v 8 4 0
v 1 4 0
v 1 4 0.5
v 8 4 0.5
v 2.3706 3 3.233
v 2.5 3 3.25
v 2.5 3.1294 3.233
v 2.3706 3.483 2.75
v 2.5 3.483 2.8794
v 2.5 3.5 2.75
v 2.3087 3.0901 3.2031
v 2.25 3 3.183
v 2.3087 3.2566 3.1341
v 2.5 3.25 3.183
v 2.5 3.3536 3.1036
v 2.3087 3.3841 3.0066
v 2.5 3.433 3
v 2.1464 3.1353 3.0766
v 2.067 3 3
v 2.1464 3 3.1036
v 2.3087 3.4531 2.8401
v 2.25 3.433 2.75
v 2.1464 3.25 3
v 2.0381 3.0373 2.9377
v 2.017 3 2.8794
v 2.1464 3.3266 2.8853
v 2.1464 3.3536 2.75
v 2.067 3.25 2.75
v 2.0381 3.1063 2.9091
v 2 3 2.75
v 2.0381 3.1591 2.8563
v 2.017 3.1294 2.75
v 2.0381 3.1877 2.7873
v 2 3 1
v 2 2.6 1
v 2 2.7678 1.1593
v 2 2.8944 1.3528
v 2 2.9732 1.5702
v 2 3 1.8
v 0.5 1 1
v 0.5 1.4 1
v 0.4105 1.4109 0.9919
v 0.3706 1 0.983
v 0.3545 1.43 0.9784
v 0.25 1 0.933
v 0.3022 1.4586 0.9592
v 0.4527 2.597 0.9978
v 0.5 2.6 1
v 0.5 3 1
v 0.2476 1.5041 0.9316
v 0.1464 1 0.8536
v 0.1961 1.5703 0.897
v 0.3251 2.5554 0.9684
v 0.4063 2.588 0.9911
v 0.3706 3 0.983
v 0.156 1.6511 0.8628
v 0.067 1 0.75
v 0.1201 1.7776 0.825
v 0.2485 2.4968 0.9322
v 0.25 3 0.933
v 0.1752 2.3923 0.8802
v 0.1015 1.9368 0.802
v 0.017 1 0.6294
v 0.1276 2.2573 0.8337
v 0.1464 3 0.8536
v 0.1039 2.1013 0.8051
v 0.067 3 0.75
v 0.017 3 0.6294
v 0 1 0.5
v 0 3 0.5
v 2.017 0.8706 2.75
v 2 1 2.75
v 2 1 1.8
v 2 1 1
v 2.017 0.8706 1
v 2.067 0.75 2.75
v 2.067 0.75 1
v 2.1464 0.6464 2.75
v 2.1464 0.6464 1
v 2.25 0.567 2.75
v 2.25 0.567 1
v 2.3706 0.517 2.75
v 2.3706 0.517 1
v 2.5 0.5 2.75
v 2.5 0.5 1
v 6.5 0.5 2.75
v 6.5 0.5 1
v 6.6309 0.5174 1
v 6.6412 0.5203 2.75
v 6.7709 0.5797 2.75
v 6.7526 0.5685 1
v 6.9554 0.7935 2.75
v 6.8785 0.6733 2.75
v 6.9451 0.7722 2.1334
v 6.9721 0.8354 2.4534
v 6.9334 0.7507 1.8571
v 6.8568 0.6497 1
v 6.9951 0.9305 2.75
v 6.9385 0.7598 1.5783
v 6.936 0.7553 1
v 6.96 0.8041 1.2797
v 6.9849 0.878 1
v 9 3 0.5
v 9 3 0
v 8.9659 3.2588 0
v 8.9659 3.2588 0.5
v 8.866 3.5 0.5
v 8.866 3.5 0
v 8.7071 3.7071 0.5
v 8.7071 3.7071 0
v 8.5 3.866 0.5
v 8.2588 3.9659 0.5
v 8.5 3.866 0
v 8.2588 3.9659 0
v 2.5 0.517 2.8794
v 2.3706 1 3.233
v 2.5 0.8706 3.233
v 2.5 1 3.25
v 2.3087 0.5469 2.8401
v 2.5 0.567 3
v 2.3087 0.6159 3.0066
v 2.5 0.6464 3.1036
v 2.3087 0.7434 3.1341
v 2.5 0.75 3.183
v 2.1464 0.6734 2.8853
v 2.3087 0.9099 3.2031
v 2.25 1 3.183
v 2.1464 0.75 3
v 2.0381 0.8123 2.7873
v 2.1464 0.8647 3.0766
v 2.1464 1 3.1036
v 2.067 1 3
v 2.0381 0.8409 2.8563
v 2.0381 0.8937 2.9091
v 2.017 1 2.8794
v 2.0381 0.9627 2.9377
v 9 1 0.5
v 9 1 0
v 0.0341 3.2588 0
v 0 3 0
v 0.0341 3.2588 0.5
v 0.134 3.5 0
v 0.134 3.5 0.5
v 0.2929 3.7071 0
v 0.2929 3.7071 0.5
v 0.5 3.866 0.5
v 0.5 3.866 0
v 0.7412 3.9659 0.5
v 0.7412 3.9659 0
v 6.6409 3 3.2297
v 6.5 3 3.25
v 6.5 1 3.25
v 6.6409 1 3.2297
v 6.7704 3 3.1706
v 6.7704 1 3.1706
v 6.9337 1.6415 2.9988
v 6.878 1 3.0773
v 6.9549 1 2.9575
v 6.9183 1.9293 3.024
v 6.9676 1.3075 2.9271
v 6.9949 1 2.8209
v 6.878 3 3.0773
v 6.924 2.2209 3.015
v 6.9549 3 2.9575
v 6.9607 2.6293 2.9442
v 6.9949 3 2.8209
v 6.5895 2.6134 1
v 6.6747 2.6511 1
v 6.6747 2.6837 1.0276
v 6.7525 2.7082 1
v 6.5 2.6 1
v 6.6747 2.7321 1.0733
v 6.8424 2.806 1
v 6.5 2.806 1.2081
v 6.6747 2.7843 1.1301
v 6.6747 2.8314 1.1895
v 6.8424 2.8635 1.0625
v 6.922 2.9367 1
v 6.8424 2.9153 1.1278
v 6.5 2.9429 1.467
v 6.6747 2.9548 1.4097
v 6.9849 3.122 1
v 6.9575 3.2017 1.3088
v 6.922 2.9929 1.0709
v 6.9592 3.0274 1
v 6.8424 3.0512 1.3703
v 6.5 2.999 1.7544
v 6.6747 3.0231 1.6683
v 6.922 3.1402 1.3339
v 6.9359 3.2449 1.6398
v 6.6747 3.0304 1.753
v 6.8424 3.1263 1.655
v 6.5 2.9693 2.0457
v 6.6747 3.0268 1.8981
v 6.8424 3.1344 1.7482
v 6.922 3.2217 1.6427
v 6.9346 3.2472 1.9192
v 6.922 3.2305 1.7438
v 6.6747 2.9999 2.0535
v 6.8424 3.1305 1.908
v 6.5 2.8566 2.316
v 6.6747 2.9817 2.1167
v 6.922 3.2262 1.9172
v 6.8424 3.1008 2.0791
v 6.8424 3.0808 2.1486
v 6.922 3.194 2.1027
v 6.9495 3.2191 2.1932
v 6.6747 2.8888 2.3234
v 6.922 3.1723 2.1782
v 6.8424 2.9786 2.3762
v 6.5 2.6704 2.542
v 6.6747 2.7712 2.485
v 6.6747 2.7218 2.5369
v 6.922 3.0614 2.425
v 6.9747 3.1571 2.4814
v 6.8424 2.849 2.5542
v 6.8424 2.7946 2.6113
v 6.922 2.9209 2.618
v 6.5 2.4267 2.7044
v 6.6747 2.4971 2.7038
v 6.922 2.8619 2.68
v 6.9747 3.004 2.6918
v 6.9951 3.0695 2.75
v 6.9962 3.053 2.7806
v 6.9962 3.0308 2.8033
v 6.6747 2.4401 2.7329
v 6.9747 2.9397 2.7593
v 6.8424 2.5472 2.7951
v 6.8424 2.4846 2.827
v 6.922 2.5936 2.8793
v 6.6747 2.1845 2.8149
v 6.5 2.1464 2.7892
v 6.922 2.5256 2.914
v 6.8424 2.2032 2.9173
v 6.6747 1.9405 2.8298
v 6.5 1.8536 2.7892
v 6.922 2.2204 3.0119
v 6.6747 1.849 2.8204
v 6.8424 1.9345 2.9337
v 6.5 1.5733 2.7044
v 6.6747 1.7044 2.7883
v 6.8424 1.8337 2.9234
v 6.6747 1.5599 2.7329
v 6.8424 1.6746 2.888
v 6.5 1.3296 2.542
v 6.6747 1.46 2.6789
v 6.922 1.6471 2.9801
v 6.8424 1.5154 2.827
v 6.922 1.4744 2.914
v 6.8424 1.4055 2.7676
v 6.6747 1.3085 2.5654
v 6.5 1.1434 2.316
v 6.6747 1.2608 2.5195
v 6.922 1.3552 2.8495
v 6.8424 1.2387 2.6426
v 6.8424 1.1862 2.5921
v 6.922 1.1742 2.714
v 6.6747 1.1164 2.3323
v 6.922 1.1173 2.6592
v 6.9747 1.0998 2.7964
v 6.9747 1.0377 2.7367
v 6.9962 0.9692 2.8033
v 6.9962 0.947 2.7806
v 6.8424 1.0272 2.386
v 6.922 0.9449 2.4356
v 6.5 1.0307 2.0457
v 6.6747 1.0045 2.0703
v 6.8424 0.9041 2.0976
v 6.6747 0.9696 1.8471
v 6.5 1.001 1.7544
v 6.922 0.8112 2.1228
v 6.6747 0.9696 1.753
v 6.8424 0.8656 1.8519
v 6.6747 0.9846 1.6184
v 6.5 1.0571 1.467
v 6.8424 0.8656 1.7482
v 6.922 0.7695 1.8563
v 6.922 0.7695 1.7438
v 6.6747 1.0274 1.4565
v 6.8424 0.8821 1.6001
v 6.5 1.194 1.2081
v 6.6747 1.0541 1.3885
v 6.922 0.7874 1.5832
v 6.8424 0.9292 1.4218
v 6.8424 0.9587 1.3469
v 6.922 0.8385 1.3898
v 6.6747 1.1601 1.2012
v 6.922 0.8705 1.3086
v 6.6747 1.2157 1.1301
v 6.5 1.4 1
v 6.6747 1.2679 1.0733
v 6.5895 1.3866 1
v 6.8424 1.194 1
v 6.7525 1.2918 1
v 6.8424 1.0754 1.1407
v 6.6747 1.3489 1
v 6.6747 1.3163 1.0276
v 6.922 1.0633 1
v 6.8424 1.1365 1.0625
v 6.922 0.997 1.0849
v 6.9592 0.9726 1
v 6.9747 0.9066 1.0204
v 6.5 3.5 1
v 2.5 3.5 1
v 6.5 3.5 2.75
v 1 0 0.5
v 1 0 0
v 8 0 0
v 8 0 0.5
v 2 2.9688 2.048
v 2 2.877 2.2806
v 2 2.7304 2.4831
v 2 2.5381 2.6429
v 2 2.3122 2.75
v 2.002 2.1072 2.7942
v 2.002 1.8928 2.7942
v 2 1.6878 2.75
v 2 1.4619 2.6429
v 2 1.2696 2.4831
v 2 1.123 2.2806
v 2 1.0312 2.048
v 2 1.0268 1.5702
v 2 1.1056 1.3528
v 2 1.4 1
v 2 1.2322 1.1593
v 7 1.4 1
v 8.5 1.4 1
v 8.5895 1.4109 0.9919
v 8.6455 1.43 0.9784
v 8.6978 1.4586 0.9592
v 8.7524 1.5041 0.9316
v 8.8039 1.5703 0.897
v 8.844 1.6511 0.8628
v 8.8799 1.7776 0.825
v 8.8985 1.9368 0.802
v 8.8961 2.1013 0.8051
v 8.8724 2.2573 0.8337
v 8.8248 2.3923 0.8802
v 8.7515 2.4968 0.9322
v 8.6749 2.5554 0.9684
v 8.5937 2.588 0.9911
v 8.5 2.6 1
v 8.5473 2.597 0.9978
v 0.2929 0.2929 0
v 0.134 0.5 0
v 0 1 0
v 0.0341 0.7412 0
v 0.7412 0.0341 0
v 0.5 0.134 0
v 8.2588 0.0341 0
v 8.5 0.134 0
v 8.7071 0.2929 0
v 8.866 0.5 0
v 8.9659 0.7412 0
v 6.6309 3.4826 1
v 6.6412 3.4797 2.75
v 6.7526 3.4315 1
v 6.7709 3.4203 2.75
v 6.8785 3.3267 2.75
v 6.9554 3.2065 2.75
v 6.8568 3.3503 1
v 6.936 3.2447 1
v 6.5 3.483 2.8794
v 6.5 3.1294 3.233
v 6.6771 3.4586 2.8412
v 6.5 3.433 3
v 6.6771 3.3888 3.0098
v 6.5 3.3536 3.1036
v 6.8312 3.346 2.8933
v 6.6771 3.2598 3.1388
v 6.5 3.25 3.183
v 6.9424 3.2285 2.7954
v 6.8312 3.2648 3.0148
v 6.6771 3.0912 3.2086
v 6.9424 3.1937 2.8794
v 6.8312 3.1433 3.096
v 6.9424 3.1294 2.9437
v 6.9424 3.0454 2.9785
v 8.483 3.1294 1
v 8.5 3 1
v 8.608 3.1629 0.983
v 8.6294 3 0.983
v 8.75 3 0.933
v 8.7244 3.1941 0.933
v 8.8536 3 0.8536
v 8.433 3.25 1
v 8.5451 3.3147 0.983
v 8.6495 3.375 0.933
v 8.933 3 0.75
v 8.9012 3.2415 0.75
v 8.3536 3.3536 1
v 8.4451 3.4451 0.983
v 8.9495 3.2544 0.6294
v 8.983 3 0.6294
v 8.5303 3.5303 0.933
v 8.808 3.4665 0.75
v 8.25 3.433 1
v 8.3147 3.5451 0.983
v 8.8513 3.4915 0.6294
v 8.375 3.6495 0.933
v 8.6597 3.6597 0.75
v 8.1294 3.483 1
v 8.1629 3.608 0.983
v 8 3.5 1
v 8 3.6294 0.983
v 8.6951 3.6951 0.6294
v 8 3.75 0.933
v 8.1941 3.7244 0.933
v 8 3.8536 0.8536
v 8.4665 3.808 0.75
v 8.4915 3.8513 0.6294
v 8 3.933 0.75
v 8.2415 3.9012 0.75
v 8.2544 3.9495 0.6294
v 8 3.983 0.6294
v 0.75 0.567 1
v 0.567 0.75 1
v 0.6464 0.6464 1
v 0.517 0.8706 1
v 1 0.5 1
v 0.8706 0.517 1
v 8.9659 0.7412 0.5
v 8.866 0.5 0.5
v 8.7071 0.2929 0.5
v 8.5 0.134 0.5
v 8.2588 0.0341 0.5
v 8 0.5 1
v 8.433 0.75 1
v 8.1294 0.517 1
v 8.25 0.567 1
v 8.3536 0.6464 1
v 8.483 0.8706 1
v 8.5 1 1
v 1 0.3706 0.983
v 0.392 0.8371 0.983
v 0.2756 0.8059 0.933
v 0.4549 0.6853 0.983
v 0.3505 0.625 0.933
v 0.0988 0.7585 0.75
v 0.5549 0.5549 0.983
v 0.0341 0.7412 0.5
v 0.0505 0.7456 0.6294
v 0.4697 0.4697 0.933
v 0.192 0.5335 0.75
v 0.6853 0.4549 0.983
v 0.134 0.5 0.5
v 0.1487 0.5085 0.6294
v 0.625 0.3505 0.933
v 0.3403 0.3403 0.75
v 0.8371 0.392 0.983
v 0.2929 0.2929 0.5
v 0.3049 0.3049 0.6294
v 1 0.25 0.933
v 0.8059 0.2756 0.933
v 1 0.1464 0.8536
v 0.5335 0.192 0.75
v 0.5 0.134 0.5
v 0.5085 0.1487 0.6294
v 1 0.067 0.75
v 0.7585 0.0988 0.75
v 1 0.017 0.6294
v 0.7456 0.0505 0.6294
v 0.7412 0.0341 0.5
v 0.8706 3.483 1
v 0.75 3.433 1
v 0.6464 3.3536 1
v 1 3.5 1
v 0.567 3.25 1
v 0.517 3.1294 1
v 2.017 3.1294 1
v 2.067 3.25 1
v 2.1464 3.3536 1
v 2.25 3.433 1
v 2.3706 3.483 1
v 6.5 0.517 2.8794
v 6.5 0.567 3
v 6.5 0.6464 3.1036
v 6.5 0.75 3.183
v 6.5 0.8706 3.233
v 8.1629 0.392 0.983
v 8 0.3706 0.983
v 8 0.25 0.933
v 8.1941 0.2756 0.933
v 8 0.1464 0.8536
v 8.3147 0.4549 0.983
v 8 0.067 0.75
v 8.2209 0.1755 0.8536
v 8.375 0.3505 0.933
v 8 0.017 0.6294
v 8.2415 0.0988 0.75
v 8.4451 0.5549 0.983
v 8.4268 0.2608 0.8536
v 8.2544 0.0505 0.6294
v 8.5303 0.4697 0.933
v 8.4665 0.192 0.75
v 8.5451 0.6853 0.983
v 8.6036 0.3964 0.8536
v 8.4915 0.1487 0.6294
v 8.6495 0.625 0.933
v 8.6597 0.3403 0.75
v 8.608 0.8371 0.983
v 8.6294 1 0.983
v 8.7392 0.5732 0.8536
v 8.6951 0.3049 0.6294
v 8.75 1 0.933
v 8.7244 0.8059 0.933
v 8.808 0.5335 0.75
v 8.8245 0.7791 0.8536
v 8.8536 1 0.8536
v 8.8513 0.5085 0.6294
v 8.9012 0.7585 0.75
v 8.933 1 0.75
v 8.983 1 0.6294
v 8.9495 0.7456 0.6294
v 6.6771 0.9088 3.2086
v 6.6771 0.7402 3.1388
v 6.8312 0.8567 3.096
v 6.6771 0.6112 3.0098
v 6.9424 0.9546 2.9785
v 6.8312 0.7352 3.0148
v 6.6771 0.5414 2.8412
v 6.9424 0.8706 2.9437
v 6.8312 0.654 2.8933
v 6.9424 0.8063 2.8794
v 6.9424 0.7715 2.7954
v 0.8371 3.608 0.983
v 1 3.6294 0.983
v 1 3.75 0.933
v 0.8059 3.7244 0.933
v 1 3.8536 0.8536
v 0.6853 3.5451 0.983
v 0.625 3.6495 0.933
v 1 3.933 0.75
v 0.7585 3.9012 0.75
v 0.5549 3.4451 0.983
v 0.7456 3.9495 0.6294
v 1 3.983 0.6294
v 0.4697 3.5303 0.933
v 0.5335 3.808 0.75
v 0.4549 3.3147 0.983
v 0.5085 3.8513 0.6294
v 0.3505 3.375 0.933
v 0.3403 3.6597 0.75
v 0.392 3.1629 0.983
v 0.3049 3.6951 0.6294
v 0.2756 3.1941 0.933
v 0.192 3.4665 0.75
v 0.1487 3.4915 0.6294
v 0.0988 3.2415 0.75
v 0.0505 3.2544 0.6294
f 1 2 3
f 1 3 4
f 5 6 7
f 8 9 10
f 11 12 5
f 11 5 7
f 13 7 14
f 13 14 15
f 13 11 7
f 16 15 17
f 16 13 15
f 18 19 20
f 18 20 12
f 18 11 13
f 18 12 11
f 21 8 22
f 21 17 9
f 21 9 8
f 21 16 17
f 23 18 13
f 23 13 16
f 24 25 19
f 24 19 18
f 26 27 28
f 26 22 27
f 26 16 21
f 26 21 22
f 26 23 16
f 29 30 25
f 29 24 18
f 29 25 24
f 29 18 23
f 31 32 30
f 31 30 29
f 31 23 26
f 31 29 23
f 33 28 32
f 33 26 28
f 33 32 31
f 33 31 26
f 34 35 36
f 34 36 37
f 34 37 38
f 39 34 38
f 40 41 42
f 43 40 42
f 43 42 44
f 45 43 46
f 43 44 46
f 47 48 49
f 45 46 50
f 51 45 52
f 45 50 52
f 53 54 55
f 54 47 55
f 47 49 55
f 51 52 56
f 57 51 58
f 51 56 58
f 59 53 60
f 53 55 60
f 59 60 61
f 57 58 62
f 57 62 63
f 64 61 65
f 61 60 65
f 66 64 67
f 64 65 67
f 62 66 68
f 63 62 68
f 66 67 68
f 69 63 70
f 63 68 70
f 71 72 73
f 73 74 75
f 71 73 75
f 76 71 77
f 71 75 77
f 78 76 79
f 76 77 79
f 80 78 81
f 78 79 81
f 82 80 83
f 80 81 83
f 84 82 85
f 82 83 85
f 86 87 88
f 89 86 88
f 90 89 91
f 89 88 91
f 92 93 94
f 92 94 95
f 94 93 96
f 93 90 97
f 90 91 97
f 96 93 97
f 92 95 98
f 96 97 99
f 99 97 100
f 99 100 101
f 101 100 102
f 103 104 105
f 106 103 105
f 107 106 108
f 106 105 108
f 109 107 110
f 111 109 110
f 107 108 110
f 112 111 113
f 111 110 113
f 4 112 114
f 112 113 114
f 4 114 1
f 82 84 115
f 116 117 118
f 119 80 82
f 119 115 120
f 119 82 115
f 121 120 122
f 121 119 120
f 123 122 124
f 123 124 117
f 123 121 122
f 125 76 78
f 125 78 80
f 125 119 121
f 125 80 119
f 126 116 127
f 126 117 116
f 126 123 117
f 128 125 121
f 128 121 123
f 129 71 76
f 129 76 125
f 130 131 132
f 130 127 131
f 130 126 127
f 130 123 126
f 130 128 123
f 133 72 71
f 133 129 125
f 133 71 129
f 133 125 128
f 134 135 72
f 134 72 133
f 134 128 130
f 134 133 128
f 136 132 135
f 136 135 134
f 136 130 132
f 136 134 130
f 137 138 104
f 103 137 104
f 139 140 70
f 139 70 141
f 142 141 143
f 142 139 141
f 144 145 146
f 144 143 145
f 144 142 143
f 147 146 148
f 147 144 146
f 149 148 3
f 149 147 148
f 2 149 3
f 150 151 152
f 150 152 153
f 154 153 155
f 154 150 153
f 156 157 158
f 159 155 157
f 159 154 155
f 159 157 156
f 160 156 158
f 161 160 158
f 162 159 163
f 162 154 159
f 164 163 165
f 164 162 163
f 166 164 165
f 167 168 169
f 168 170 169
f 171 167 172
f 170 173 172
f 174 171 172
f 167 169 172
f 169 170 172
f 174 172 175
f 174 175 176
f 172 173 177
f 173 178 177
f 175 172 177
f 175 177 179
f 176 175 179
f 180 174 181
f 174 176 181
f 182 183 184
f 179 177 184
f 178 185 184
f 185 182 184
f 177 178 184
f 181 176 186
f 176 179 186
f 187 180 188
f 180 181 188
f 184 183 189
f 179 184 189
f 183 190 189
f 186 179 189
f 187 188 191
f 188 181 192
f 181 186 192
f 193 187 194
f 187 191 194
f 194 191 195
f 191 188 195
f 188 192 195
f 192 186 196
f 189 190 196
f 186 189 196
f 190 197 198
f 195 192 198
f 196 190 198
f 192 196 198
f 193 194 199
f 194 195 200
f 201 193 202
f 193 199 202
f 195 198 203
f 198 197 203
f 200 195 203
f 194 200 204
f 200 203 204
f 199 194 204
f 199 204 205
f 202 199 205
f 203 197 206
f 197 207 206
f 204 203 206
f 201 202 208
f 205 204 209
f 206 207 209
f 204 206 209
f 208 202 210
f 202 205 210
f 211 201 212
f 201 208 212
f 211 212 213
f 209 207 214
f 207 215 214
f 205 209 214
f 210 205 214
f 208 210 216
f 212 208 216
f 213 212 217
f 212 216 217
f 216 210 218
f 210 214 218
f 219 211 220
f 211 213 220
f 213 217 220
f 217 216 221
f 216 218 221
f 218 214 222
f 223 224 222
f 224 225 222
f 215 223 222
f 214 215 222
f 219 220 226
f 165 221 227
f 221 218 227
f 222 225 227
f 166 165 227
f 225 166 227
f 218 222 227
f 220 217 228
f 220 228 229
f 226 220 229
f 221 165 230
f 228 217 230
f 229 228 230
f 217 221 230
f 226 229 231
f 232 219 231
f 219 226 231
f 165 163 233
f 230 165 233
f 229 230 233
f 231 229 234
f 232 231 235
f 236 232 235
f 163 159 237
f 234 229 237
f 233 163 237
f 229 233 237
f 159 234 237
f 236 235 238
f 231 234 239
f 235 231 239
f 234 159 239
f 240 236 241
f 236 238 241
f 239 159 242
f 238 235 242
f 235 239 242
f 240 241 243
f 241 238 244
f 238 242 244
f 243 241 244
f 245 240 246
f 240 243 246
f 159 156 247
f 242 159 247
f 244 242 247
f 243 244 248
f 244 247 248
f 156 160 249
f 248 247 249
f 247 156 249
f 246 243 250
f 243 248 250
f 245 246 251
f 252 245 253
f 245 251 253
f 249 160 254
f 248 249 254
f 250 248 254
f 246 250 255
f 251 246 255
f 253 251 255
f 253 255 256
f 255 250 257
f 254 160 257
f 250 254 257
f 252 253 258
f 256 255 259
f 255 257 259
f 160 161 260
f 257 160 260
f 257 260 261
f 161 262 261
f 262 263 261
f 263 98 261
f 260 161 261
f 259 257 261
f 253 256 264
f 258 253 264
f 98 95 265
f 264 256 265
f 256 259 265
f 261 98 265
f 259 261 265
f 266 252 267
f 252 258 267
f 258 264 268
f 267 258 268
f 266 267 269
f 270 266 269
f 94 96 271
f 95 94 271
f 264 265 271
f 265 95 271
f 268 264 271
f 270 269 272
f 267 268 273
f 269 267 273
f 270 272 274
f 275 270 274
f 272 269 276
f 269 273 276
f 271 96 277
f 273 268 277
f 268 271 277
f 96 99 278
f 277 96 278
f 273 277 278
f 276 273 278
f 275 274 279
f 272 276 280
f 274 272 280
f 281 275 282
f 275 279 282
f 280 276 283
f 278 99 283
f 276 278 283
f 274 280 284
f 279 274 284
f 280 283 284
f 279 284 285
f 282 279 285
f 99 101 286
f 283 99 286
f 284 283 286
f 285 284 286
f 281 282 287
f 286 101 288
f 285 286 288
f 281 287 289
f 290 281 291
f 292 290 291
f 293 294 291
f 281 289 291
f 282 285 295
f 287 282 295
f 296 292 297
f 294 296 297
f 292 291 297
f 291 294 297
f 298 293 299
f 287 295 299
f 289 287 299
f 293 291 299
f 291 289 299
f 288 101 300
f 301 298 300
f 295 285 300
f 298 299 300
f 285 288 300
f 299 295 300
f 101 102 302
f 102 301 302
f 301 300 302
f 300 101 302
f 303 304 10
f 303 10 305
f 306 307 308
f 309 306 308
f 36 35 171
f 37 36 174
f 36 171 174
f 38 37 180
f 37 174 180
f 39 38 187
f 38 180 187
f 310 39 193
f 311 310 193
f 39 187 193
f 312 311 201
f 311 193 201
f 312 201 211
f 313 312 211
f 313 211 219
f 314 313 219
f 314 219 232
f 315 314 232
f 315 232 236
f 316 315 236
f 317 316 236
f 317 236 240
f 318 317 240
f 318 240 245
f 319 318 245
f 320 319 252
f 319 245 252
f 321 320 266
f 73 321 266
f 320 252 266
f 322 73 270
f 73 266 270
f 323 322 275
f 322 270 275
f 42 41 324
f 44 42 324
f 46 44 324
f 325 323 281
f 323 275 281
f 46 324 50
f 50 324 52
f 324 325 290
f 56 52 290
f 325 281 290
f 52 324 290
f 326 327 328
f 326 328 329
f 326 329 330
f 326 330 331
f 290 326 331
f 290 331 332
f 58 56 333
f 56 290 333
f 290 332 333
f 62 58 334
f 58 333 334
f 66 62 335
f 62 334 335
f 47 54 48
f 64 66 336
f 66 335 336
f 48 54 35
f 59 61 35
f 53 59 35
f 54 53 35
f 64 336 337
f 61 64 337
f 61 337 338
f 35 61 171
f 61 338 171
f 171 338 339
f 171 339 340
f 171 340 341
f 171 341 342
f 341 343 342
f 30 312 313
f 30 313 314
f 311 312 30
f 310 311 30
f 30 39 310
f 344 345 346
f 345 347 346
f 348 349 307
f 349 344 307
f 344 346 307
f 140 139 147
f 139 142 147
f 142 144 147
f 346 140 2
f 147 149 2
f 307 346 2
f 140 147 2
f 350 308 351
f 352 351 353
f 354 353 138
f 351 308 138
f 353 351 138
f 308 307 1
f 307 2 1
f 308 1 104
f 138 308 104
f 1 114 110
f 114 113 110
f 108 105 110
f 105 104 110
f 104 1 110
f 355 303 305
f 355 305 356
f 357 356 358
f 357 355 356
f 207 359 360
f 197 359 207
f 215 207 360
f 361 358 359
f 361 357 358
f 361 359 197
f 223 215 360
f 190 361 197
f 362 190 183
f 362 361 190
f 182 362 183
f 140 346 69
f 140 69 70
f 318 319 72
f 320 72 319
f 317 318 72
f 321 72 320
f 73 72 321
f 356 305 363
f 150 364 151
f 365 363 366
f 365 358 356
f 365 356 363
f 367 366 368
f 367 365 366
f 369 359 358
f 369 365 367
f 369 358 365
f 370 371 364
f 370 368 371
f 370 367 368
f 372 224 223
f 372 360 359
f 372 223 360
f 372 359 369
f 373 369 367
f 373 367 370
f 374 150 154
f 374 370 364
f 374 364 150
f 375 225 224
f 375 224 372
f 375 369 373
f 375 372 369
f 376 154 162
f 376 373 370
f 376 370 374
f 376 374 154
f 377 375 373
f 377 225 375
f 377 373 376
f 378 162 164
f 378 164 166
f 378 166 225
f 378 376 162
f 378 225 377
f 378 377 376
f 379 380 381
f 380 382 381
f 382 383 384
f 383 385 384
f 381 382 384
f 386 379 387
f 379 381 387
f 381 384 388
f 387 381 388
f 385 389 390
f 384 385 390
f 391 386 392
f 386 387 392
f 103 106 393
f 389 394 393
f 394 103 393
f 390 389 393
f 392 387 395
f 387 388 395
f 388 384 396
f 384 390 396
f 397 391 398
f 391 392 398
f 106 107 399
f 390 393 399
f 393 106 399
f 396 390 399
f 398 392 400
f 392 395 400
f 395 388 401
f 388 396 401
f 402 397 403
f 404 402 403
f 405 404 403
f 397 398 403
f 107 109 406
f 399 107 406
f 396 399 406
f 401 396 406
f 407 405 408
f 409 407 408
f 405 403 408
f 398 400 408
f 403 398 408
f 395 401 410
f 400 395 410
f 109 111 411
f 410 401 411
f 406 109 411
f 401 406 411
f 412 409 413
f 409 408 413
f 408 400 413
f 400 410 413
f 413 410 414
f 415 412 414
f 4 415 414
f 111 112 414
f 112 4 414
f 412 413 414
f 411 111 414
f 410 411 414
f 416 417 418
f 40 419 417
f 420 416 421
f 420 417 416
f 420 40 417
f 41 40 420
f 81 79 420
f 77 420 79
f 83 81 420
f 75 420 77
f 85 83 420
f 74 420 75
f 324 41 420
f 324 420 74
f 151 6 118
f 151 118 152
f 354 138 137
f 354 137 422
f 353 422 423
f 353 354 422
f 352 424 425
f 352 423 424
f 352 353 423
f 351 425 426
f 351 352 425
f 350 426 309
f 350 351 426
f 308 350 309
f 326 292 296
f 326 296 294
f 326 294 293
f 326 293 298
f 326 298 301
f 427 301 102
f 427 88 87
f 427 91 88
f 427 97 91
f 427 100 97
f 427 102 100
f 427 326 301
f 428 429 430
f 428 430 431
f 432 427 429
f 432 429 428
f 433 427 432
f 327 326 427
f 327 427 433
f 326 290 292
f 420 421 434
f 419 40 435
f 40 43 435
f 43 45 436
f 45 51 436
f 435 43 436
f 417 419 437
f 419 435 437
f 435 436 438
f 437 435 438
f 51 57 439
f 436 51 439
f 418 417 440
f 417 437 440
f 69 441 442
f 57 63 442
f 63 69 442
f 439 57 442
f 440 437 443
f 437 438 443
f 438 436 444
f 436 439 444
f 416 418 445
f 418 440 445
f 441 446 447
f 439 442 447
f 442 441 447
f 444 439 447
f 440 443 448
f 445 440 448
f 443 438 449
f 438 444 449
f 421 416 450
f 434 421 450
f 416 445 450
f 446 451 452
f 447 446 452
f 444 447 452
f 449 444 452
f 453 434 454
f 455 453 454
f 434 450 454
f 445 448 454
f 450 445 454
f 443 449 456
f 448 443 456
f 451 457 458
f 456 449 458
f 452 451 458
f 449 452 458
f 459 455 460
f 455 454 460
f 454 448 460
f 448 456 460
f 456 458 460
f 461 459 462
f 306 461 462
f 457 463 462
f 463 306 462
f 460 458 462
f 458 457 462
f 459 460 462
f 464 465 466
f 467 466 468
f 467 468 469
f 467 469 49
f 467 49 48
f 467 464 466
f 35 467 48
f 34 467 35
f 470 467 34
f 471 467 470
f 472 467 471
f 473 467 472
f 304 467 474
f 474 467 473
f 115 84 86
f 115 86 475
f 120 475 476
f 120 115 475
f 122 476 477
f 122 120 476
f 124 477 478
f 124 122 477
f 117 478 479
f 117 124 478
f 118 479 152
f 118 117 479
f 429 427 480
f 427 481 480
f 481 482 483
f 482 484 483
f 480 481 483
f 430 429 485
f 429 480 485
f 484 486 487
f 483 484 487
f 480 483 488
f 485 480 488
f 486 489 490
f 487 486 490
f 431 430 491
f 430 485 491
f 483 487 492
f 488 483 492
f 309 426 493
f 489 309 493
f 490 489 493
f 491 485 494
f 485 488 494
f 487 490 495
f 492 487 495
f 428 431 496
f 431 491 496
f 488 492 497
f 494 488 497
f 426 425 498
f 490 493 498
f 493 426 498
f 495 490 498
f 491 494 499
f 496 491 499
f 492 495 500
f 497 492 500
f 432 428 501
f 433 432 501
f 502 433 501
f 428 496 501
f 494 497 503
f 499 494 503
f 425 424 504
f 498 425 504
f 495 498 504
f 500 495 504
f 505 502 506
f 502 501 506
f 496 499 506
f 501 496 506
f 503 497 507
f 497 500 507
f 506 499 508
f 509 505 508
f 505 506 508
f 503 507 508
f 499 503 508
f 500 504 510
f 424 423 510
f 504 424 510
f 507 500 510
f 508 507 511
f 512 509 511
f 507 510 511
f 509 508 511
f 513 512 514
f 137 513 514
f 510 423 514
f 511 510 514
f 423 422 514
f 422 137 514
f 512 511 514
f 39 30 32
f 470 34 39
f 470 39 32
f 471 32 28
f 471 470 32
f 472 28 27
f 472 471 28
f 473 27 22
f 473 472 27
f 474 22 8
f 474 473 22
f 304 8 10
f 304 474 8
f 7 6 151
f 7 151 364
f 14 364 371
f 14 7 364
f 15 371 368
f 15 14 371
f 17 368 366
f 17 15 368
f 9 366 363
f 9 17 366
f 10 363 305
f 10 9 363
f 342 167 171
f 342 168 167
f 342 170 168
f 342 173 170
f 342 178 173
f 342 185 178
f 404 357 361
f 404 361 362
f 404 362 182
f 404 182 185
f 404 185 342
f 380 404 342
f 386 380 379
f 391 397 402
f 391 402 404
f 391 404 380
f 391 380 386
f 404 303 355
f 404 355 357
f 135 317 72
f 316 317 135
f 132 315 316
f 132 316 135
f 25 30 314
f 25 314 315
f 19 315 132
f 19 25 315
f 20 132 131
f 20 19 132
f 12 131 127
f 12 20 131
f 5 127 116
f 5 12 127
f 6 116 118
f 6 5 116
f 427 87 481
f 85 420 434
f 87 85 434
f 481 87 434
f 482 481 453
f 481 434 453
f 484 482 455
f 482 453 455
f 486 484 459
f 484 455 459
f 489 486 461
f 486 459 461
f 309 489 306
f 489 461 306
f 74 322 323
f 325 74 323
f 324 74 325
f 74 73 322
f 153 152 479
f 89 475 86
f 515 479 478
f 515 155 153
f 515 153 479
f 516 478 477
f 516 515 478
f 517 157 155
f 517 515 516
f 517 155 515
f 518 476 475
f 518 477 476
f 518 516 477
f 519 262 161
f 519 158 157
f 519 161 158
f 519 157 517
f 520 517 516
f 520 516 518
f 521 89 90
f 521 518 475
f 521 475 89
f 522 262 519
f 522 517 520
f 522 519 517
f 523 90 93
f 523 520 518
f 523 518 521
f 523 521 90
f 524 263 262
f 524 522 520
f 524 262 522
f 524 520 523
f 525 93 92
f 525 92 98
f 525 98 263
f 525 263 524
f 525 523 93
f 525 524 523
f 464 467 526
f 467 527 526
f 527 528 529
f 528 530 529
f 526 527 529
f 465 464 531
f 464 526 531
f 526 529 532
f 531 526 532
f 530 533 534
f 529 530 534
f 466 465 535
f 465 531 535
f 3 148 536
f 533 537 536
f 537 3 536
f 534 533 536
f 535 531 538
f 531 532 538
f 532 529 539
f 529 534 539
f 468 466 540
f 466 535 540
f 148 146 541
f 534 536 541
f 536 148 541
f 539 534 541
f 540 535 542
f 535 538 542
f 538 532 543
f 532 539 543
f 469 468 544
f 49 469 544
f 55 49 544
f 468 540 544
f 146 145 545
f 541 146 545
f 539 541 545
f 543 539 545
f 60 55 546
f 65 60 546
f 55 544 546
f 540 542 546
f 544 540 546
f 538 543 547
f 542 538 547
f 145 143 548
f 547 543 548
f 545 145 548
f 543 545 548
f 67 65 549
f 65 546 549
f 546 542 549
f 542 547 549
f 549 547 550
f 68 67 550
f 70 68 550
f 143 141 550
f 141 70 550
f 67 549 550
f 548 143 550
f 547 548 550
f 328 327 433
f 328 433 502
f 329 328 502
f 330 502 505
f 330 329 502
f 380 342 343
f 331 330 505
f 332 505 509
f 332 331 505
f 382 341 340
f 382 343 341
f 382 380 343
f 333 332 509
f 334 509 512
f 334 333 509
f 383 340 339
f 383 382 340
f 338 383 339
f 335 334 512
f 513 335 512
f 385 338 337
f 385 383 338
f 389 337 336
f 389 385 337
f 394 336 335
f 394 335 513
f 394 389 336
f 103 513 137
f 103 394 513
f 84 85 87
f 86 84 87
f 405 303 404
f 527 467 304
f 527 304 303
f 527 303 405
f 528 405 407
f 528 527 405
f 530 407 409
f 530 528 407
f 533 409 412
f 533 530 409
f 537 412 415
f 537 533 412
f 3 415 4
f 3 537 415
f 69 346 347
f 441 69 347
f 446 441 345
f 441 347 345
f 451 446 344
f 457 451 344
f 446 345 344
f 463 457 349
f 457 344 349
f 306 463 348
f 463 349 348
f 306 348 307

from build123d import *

# Parameters (mm, degrees)
F0_W         = 5
F0_H         = 3
F1_DEPTH     = 3.25
F0_W_2       = 9
F0_H_2       = 4
F2_DEPTH     = 1
F5_DEPTH     = 12.5
F6_T1_DEPTH  = 4
F6_T3_DEPTH  = 2
F6_T5_DEPTH  = 1.75
F6_S9_W      = 0.5
F6_S9_H      = 0.5
F6_T10_DEPTH = 0.5
F6_S15_W     = 0.5
F6_S15_H     = 0.5
F6_T16_DEPTH = 0.5
F6_S21_W     = 0.5
F6_S21_H     = 0.5
F6_T22_DEPTH = 0.5
F6_S27_W     = 0.5
F6_S27_H     = 0.5
F6_T28_DEPTH = 0.5
F6_T34_ANGLE = 359.64
F7_T1_DEPTH  = 15
F7_T3_DEPTH  = 7.4
F7_T5_DEPTH  = 7.4
F8_T1_DEPTH  = 3.5
F8_T4_ANGLE  = 90
F8_T6_ANGLE  = 90
F8_T8_ANGLE  = 90
F8_T10_ANGLE = 90


# Not quite as in the source:
# - a fillet or chamfer that OpenCascade refuses, or shapes differently, is made with other operations: its cross-section is extruded or revolved along the edge and cut away or added
# - a feature names something its author has since deleted; it is built from what else it names


with BuildPart() as f1:
    # F0 (on Top) → F1 (new body)
    with BuildSketch(Plane.XY):
        with Locations((4.5, 2)):
            Rectangle(F0_W, F0_H)
    extrude(amount=F1_DEPTH)

    # F0 (on Top) → F2 (join)
    with BuildSketch(Plane.XY):
        with Locations((4.5, 2)):
            Rectangle(F0_W_2, F0_H_2)
        with Locations((4.5, 2)):
            Rectangle(F0_W, F0_H, mode=Mode.SUBTRACT)
    extrude(amount=F2_DEPTH)

    # F4 (on face) → F5 (cut, symmetric)
    with BuildSketch(Plane.YZ.offset(7)):
        with BuildLine():
            Line((2.6, 1), (1.4, 1))
            ThreePointArc((1.4, 1), (2, 0.8), (2.6, 1))
        make_face()
        with BuildLine():
            ThreePointArc((2.6, 1), (2.894427191, 1.3527864045), (3, 1.8))
            ThreePointArc((3, 1.8), (1.5527864045, 2.694427191), (1.4, 1))
            Line((1.4, 1), (2.6, 1))
        make_face()
    extrude(amount=F5_DEPTH, both=True, mode=Mode.SUBTRACT)

    # F6: fillet of radius 0.5 on 9 edges, made by hand

    # F6_s2 → F6_t1 (cut)
    with BuildSketch(Plane.YZ.offset(2.5)):
        with BuildLine():
            ThreePointArc((0.5, 2.75), (0.6464466094, 3.1035533906), (1, 3.25))
            Line((1, 3.25), (0.5, 3.25))
            Line((0.5, 3.25), (0.5, 2.75))
        make_face()
        with BuildLine():
            ThreePointArc((3, 3.25), (3.3535533906, 3.1035533906), (3.5, 2.75))
            Line((3.5, 2.75), (3.5, 3.25))
            Line((3.5, 3.25), (3, 3.25))
        make_face()
    extrude(amount=F6_T1_DEPTH, mode=Mode.SUBTRACT)

    # F6_s4 → F6_t3 (cut)
    with BuildSketch(Plane.XZ.offset(-3)):
        with BuildLine():
            ThreePointArc((6.5, 3.25), (6.8535533906, 3.1035533906), (7, 2.75))
            Line((7, 2.75), (7, 3.25))
            Line((7, 3.25), (6.5, 3.25))
        make_face()
        with BuildLine():
            ThreePointArc((2, 2.75), (2.1464466094, 3.1035533906), (2.5, 3.25))
            Line((2.5, 3.25), (2, 3.25))
            Line((2, 3.25), (2, 2.75))
        make_face()
    extrude(amount=F6_T3_DEPTH, mode=Mode.SUBTRACT)

    # F6_s6 → F6_t5 (cut)
    with BuildSketch(Plane.XY.offset(1)):
        with BuildLine():
            ThreePointArc((6.5, 0.5), (6.8535533906, 0.6464466094), (7, 1))
            Line((7, 1), (7, 0.5))
            Line((7, 0.5), (6.5, 0.5))
        make_face()
        with BuildLine():
            ThreePointArc((6.5, 3.5), (6.8535533906, 3.3535533906), (7, 3))
            Line((7, 3), (7, 3.5))
            Line((7, 3.5), (6.5, 3.5))
        make_face()
        with BuildLine():
            ThreePointArc((2, 1), (2.1464466094, 0.6464466094), (2.5, 0.5))
            Line((2.5, 0.5), (2, 0.5))
            Line((2, 0.5), (2, 1))
        make_face()
        with BuildLine():
            ThreePointArc((2, 3), (2.1464466094, 3.3535533906), (2.5, 3.5))
            Line((2.5, 3.5), (2, 3.5))
            Line((2, 3.5), (2, 3))
        make_face()
    extrude(amount=F6_T5_DEPTH, mode=Mode.SUBTRACT)


with BuildPart() as f6_tool8:
    # F6_s9 → F6_t10 (new body)
    with BuildSketch(Plane.YZ.offset(2.5)):
        with Locations((0.75, 3)):
            Rectangle(F6_S9_W, F6_S9_H)
    extrude(amount=-F6_T10_DEPTH)

    # F6_s11 → F6_t12 (revolve, cut)
    with BuildSketch(Plane(origin=(2.5, 1, 2.75), x_dir=(0, 0.7071067812, -0.7071067812), z_dir=(0, 0.7071067812, 0.7071067812))):
        with BuildLine():
            ThreePointArc((0, -0.5), (0.5, 0), (0, 0.5))
            Line((0, 0.5), (0, -0.5))
        make_face()
    revolve(axis=Axis((2.5, 1, 2.75), (-1, 0, 0)), mode=Mode.SUBTRACT)


with BuildPart() as f1_1:
    add(f1.part)

    # F6_t7: cut F6_tool8
    add(f6_tool8.part, mode=Mode.SUBTRACT)


with BuildPart() as f6_tool14:
    # F6_s15 → F6_t16 (new body)
    with BuildSketch(Plane.YZ.offset(6.5)):
        with Locations((0.75, 3)):
            Rectangle(F6_S15_W, F6_S15_H)
    extrude(amount=F6_T16_DEPTH)

    # F6_s17 → F6_t18 (revolve, cut)
    with BuildSketch(Plane(origin=(6.5, 1, 2.75), x_dir=(0, 0.7071067812, -0.7071067812), z_dir=(0, -0.7071067812, -0.7071067812))):
        with BuildLine():
            ThreePointArc((0, -0.5), (0.5, 0), (0, 0.5))
            Line((0, 0.5), (0, -0.5))
        make_face()
    revolve(axis=Axis((6.5, 1, 2.75), (1, 0, 0)), mode=Mode.SUBTRACT)


with BuildPart() as f1_2:
    add(f1_1.part)

    # F6_t13: cut F6_tool14
    add(f6_tool14.part, mode=Mode.SUBTRACT)


with BuildPart() as f6_tool20:
    # F6_s21 → F6_t22 (new body)
    with BuildSketch(Plane.YZ.offset(6.5)):
        with Locations((3.25, 3)):
            Rectangle(F6_S21_W, F6_S21_H)
    extrude(amount=F6_T22_DEPTH)

    # F6_s23 → F6_t24 (revolve, cut)
    with BuildSketch(Plane(origin=(6.5, 3, 2.75), x_dir=(0, -0.7071067812, -0.7071067812), z_dir=(0, -0.7071067812, 0.7071067812))):
        with BuildLine():
            ThreePointArc((0, -0.5), (0.5, 0), (0, 0.5))
            Line((0, 0.5), (0, -0.5))
        make_face()
    revolve(axis=Axis((6.5, 3, 2.75), (1, 0, 0)), mode=Mode.SUBTRACT)


with BuildPart() as f1_3:
    add(f1_2.part)

    # F6_t19: cut F6_tool20
    add(f6_tool20.part, mode=Mode.SUBTRACT)


with BuildPart() as f6_tool26:
    # F6_s27 → F6_t28 (new body)
    with BuildSketch(Plane.YZ.offset(2.5)):
        with Locations((3.25, 3)):
            Rectangle(F6_S27_W, F6_S27_H)
    extrude(amount=-F6_T28_DEPTH)

    # F6_s29 → F6_t30 (revolve, cut)
    with BuildSketch(Plane(origin=(2.5, 3, 2.75), x_dir=(0, -0.7071067812, -0.7071067812), z_dir=(0, 0.7071067812, -0.7071067812))):
        with BuildLine():
            ThreePointArc((0, -0.5), (0.5, 0), (0, 0.5))
            Line((0, 0.5), (0, -0.5))
        make_face()
    revolve(axis=Axis((2.5, 3, 2.75), (-1, 0, 0)), mode=Mode.SUBTRACT)


with BuildPart() as f1_4:
    add(f1_3.part)

    # F6_t25: cut F6_tool26
    add(f6_tool26.part, mode=Mode.SUBTRACT)


with BuildPart() as f6_tool32:
    # F6_s33 → F6_t34 (revolve)
    with BuildSketch(Plane(origin=(0, 2.0056350904, 0.0063009092), x_dir=(1, 0, 0), z_dir=(0, -0.9999950652, -0.0031415875))):
        with BuildLine():
            ThreePointArc((6.5, 0.7937079424), (6.8535533906, 0.647261333), (7, 0.2937079424))
            Line((7, 0.2937079424), (7, 0.7937079424))
            Line((7, 0.7937079424), (6.5, 0.7937079424))
        make_face()
    revolve(axis=Axis((7, 2, 1.8), (1, 0, 0)), revolution_arc=F6_T34_ANGLE)

    split(bisect_by=Plane.XY.offset(1), keep=Keep.TOP)


with BuildPart() as f1_5:
    add(f1_4.part)

    # F6_t31: cut F6_tool32
    add(f6_tool32.part, mode=Mode.SUBTRACT)

    # F7: fillet of radius 0.5 on 4 edges, made by hand

    # F7_s2 → F7_t1 (cut)
    with BuildSketch(Plane.YZ.offset(-3)):
        with BuildLine():
            ThreePointArc((3.5, 1), (3.8535533906, 0.8535533906), (4, 0.5))
            Line((4, 0.5), (4.01, 0.5))
            Line((4.01, 0.5), (4.01, 1.01))
            Line((4.01, 1.01), (3.5, 1.01))
            Line((3.5, 1.01), (3.5, 1))
        make_face()
        with BuildLine():
            ThreePointArc((0.5, 1), (0.1464466094, 0.8535533906), (0, 0.5))
            Line((0, 0.5), (-0.01, 0.5))
            Line((-0.01, 0.5), (-0.01, 1.01))
            Line((-0.01, 1.01), (0.5, 1.01))
            Line((0.5, 1.01), (0.5, 1))
        make_face()
    extrude(amount=F7_T1_DEPTH, mode=Mode.SUBTRACT)

    # F7_s4 → F7_t3 (cut)
    with BuildSketch(Plane.XZ.offset(-4.4)):
        with BuildLine():
            ThreePointArc((0.5, 1), (0.1464466094, 0.8535533906), (0, 0.5))
            Line((0, 0.5), (-0.01, 0.5))
            Line((-0.01, 0.5), (-0.01, 1.01))
            Line((-0.01, 1.01), (0.5, 1.01))
            Line((0.5, 1.01), (0.5, 1))
        make_face()
    extrude(amount=F7_T3_DEPTH, mode=Mode.SUBTRACT)

    # F7_s6 → F7_t5 (cut)
    with BuildSketch(Plane.XZ.offset(-7)):
        with BuildLine():
            ThreePointArc((8.5, 1), (8.8535533906, 0.8535533906), (9, 0.5))
            Line((9, 0.5), (9.01, 0.5))
            Line((9.01, 0.5), (9.01, 1.01))
            Line((9.01, 1.01), (8.5, 1.01))
            Line((8.5, 1.01), (8.5, 1))
        make_face()
    extrude(amount=F7_T5_DEPTH, mode=Mode.SUBTRACT)

    # F8: fillet of radius 1 on 4 edges, made by hand

    # F8_s2 → F8_t1 (cut)
    with BuildSketch(Plane.XY.offset(-2.5)):
        with BuildLine():
            ThreePointArc((9, 1), (8.7071067812, 0.2928932188), (8, 0))
            Line((8, 0), (9, 0))
            Line((9, 0), (9, 1))
        make_face()
        with BuildLine():
            ThreePointArc((9, 3), (8.7071067812, 3.7071067812), (8, 4))
            Line((8, 4), (9, 4))
            Line((9, 4), (9, 3))
        make_face()
        with BuildLine():
            ThreePointArc((0, 1), (0.2928932188, 0.2928932188), (1, 0))
            Line((1, 0), (0, 0))
            Line((0, 0), (0, 1))
        make_face()
        with BuildLine():
            ThreePointArc((0, 3), (0.2928932188, 3.7071067812), (1, 4))
            Line((1, 4), (0, 4))
            Line((0, 4), (0, 3))
        make_face()
    extrude(amount=F8_T1_DEPTH, mode=Mode.SUBTRACT)

    # F8_s3 → F8_t4 (revolve, cut)
    with BuildSketch(Plane.YZ.offset(1)):
        with BuildLine():
            ThreePointArc((3.5, 1), (3.8535533906, 0.8535533906), (4, 0.5))
            Line((4, 0.5), (4, 1))
            Line((4, 1), (3.5, 1))
        make_face()
    revolve(axis=Axis((1, 3, 1), (0, 0, 1)), revolution_arc=F8_T4_ANGLE, mode=Mode.SUBTRACT)

    # F8_s5 → F8_t6 (revolve, cut)
    with BuildSketch(Plane.XZ.offset(-1)):
        with BuildLine():
            ThreePointArc((0.5, 1), (0.1464466094, 0.8535533906), (0, 0.5))
            Line((0, 0.5), (0, 1))
            Line((0, 1), (0.5, 1))
        make_face()
    revolve(axis=Axis((1, 1, 1), (0, 0, 1)), revolution_arc=F8_T6_ANGLE, mode=Mode.SUBTRACT)

    # F8_s7 → F8_t8 (revolve, cut)
    with BuildSketch(Plane.XZ.offset(-3)):
        with BuildLine():
            ThreePointArc((8.5, 1), (8.8535533906, 0.8535533906), (9, 0.5))
            Line((9, 0.5), (9, 1))
            Line((9, 1), (8.5, 1))
        make_face()
    revolve(axis=Axis((8, 3, 1), (0, 0, 1)), revolution_arc=F8_T8_ANGLE, mode=Mode.SUBTRACT)

    # F8_s9 → F8_t10 (revolve, cut)
    with BuildSketch(Plane.YZ.offset(8)):
        with BuildLine():
            ThreePointArc((0.5, 1), (0.1464466094, 0.8535533906), (0, 0.5))
            Line((0, 0.5), (0, 1))
            Line((0, 1), (0.5, 1))
        make_face()
    revolve(axis=Axis((8, 1, 1), (0, 0, 1)), revolution_arc=F8_T10_ANGLE, mode=Mode.SUBTRACT)


solid = f1_5.part
